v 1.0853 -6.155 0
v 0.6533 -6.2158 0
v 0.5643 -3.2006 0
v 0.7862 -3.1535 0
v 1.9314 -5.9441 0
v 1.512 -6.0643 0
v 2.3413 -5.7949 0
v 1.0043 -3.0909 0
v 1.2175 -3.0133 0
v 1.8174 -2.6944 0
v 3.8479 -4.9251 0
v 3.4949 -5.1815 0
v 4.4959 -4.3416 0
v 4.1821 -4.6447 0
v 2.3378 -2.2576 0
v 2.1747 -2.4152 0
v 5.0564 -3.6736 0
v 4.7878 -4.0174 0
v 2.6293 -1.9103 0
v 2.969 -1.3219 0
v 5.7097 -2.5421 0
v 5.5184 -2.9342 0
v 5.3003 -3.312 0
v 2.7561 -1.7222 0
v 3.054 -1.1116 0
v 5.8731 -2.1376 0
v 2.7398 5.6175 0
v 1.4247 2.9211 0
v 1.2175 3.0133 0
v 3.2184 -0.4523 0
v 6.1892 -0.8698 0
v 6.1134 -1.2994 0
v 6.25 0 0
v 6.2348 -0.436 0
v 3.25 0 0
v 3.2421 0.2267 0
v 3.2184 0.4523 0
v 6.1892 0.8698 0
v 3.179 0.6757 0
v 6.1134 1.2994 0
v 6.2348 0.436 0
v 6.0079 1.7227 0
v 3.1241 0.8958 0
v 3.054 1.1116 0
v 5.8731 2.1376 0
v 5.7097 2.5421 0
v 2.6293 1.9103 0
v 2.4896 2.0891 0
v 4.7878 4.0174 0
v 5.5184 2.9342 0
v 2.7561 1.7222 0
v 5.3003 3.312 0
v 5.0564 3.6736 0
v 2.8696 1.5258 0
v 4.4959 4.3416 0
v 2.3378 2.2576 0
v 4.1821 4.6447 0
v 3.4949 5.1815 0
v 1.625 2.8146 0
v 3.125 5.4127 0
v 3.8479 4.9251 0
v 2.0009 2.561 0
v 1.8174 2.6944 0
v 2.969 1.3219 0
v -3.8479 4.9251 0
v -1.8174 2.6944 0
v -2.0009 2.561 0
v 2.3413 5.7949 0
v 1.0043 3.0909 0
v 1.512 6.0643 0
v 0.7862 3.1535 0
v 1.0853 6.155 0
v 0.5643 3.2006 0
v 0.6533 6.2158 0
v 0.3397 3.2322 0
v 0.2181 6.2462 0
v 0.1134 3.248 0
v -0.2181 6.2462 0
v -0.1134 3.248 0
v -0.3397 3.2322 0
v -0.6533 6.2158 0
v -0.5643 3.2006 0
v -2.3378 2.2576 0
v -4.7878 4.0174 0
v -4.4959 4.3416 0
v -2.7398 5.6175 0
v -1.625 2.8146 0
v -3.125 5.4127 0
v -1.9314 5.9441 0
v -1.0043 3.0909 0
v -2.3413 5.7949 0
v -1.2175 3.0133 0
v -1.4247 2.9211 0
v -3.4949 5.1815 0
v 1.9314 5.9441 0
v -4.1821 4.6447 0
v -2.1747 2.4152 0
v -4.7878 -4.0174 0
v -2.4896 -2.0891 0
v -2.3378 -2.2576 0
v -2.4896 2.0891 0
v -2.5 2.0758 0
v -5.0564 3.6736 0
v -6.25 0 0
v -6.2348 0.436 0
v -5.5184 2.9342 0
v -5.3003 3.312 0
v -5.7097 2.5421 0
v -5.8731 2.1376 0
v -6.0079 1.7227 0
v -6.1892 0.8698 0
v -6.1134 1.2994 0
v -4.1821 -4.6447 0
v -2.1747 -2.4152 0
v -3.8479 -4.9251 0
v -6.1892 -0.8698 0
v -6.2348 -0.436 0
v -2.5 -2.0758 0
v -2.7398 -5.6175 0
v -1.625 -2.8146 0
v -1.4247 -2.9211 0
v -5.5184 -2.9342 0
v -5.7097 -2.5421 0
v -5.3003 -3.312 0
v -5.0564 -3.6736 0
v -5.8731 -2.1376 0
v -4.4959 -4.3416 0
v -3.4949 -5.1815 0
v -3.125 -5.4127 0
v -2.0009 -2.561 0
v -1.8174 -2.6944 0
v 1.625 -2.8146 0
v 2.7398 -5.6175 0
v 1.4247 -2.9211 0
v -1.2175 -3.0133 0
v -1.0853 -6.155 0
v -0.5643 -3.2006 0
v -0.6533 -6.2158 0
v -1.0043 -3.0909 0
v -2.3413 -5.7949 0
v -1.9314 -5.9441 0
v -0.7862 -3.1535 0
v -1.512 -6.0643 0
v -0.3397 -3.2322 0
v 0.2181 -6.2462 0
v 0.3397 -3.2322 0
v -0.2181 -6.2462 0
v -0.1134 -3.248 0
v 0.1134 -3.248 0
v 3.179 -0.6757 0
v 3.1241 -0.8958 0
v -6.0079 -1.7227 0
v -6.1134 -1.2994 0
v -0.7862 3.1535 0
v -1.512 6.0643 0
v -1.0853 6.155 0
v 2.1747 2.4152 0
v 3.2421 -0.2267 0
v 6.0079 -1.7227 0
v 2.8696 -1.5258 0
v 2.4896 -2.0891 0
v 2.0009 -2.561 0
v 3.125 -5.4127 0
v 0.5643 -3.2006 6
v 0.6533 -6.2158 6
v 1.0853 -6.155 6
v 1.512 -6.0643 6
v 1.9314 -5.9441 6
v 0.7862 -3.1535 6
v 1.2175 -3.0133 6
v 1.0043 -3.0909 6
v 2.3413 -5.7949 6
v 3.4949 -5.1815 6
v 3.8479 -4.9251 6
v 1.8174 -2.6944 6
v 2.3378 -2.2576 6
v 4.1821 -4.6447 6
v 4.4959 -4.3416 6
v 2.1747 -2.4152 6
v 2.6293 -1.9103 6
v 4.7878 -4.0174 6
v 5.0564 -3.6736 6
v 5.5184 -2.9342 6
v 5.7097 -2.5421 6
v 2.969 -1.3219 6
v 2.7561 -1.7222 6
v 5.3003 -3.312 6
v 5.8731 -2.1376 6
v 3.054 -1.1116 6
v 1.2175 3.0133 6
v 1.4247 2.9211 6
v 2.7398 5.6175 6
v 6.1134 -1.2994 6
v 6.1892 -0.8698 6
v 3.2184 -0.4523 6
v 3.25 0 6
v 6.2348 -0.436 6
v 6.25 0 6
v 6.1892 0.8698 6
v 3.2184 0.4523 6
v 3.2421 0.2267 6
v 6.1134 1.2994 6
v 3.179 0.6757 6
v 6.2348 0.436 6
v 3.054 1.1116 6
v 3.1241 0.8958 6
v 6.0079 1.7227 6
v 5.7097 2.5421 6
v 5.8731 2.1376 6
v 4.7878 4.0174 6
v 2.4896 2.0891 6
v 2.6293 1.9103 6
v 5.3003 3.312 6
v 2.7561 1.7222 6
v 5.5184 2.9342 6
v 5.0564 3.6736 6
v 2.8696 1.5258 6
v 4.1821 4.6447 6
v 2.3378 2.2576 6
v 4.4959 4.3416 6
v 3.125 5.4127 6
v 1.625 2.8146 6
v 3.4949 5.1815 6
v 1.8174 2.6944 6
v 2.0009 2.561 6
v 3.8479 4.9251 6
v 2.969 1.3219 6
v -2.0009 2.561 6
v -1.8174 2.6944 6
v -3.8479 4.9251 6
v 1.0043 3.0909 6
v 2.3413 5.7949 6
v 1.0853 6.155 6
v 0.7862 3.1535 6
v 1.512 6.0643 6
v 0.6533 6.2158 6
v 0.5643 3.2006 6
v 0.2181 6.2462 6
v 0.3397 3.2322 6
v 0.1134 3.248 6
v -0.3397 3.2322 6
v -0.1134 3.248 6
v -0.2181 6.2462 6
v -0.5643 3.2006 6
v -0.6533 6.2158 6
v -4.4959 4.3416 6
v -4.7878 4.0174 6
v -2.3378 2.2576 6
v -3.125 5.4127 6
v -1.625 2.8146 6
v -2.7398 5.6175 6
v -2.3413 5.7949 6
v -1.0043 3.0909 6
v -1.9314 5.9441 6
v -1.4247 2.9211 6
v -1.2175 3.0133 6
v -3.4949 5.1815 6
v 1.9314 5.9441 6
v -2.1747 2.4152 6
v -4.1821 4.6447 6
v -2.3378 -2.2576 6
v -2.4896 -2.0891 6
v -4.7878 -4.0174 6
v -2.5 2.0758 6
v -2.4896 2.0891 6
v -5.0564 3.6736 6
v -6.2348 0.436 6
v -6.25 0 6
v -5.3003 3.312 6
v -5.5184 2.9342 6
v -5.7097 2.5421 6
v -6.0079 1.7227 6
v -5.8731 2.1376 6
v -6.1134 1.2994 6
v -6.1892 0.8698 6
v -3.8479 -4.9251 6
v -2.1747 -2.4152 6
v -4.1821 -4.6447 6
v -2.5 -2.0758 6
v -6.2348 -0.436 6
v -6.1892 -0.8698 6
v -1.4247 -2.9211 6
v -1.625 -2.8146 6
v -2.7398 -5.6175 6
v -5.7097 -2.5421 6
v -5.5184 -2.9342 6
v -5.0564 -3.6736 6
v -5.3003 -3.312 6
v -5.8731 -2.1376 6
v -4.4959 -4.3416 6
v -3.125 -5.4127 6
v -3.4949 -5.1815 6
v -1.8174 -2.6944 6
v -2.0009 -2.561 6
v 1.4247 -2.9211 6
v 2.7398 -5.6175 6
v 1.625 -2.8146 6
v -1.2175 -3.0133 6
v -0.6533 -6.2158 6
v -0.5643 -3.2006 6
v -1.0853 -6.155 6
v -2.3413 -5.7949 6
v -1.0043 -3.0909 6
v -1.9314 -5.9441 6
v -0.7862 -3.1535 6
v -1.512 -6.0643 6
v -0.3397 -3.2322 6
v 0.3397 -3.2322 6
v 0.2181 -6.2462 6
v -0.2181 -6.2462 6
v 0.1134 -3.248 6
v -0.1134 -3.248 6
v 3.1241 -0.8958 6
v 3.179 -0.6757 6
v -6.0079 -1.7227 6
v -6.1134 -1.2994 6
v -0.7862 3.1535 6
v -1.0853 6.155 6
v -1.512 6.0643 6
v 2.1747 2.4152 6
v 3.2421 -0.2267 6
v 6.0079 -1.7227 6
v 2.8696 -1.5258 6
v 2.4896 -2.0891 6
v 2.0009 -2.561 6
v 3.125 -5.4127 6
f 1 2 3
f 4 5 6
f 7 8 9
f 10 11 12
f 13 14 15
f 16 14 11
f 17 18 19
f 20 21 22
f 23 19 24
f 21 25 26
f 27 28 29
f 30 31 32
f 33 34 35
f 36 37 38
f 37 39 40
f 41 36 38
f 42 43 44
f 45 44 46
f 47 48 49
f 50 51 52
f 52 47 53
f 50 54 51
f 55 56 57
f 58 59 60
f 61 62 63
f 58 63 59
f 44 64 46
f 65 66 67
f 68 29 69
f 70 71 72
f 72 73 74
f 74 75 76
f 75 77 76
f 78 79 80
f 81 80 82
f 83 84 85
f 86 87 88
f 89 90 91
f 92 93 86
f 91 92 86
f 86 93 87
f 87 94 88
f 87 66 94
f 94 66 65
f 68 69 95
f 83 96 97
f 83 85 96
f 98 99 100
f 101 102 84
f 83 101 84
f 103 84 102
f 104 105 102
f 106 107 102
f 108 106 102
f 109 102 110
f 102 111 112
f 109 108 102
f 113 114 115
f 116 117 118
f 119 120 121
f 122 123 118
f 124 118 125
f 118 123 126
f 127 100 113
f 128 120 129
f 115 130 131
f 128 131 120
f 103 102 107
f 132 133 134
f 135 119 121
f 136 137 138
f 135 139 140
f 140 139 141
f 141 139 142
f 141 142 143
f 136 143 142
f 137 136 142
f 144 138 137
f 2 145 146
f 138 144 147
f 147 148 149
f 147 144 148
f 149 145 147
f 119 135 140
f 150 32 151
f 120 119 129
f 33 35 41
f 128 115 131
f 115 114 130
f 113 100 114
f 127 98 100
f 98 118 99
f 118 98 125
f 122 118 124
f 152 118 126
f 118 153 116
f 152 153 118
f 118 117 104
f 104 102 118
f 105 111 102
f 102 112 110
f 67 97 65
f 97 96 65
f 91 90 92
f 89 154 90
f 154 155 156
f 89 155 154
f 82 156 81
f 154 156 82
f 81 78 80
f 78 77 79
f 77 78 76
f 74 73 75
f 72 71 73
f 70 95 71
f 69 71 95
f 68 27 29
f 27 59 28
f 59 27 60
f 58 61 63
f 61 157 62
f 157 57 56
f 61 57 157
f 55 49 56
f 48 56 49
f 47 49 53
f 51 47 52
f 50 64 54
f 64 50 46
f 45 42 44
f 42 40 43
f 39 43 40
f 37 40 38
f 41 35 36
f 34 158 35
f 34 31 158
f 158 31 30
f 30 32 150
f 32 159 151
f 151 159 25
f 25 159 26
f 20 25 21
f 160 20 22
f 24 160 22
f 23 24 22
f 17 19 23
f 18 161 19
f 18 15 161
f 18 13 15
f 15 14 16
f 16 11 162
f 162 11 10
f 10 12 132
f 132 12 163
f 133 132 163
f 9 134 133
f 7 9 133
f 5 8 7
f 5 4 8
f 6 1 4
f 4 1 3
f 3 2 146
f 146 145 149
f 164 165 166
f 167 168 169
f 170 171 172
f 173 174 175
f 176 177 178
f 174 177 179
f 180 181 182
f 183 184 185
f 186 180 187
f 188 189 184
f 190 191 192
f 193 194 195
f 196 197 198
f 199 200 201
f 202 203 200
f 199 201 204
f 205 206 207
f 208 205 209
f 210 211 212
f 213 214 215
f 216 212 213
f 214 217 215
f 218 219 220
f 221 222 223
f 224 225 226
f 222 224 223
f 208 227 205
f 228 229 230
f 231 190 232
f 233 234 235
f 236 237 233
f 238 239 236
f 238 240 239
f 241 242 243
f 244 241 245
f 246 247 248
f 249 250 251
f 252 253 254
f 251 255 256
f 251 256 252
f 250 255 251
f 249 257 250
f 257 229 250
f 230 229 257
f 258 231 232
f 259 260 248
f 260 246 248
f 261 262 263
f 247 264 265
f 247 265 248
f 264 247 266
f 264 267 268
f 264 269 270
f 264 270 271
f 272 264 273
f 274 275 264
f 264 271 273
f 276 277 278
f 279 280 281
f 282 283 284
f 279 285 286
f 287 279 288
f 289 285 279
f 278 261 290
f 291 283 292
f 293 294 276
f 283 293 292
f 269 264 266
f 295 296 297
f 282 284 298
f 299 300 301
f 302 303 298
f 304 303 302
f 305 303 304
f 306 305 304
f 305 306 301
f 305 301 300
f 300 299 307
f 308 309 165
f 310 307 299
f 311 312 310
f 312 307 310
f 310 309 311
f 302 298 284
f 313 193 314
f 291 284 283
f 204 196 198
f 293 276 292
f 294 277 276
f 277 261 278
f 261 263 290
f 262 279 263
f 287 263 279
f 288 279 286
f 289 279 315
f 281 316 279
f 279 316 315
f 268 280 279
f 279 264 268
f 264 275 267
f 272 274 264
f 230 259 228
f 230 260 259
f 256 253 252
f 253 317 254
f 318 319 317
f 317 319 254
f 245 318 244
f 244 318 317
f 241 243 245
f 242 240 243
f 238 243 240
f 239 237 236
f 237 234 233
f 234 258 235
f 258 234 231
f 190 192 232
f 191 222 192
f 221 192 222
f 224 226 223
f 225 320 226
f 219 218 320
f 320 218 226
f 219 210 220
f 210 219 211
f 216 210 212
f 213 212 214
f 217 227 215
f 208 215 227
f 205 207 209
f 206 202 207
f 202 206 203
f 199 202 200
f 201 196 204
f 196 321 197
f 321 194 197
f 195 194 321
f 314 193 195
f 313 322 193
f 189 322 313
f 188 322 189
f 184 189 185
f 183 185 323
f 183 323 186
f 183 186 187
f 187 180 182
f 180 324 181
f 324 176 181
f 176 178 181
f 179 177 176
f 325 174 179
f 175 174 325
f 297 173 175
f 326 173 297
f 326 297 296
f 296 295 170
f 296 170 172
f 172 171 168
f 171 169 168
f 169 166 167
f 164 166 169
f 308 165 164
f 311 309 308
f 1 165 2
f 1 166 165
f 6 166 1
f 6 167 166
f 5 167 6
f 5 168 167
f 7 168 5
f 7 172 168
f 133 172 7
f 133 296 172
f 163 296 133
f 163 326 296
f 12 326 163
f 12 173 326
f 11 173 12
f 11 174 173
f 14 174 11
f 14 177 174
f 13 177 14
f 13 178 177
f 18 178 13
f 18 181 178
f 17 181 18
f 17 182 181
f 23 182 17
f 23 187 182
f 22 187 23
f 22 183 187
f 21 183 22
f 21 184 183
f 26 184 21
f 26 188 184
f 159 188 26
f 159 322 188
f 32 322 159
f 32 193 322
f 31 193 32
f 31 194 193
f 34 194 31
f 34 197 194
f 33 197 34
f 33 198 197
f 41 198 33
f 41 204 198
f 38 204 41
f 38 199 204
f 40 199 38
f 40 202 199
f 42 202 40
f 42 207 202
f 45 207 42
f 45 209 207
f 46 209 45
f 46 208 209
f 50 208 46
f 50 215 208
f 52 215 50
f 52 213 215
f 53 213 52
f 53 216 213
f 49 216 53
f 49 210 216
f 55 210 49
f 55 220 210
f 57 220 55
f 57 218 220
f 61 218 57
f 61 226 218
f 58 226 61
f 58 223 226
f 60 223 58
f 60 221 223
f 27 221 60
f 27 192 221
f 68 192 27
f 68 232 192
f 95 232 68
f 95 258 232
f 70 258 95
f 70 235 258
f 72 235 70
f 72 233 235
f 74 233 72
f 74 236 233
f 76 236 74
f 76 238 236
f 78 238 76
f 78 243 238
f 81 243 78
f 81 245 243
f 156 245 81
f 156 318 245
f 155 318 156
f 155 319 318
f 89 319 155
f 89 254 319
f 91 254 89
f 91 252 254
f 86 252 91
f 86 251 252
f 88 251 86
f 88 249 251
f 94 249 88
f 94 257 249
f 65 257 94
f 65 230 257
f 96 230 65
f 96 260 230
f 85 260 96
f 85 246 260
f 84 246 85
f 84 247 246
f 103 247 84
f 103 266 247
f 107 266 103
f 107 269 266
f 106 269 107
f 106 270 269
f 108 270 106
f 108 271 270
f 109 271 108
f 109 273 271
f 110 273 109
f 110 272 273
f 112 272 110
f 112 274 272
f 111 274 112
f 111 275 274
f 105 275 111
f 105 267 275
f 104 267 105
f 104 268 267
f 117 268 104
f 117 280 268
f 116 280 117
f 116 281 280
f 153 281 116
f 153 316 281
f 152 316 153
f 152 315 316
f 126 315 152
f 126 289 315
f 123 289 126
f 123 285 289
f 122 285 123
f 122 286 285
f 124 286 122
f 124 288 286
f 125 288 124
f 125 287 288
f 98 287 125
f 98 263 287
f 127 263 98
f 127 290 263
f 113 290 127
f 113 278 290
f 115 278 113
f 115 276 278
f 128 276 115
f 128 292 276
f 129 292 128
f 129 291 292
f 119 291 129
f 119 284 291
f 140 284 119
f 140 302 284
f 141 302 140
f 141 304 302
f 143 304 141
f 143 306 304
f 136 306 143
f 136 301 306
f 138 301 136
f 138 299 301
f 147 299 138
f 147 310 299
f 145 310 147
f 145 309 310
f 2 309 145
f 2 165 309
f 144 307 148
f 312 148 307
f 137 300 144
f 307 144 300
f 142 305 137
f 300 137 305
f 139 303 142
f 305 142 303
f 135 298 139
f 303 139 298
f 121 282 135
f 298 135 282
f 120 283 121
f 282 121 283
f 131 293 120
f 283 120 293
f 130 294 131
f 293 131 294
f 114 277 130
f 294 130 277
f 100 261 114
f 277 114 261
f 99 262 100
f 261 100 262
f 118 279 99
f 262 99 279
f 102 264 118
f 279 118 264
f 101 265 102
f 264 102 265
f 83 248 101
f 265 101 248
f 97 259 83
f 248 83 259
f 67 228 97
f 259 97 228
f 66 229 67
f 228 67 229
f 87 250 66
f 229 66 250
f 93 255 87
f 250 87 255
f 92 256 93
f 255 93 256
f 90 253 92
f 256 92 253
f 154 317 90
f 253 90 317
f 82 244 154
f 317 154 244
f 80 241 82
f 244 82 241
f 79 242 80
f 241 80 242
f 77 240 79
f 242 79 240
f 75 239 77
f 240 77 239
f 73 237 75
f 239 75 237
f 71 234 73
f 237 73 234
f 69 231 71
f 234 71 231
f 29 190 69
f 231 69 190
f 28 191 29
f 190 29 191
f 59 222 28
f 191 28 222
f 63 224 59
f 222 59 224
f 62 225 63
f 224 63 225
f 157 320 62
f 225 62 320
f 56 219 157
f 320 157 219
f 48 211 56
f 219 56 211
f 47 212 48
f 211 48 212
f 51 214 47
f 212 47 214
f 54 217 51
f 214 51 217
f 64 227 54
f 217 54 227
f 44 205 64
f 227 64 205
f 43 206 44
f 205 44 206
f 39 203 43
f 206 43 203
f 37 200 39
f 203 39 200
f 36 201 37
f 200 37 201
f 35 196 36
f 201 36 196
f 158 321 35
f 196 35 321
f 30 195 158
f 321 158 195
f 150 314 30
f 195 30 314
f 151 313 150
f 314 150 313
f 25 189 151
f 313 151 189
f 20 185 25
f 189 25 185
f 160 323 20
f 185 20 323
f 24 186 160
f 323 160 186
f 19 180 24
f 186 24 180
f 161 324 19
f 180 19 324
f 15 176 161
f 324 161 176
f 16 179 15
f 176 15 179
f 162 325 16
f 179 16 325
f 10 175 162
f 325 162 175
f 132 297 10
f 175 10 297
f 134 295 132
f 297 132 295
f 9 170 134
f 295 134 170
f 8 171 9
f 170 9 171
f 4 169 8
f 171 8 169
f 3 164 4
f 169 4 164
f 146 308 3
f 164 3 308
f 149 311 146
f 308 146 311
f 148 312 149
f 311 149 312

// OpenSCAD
/*

 small part for a VO&S Spinnewiel:
 it's an bushing to slide along the flight in
 order to fix washers in place. Washers are needed to balance
 the flight.

 the 2 modules, outline() and punchout()
 describe the outline of the part and the holes
 to be punched out.

 Punchout is then subtracted from outline and the result
 is given thickness.
*/

$fn=90;

// flight is 6.5mm with a .5mm flat edge ground
// on one side. It keeps the eyelet straight
flight_dia=6.5;
flight_vlak=.5;

thickness=6;

// bus goes over flight
bus_thickness=6;
bus_id=flight_dia;
bus_od=bus_id+bus_thickness;

// create the eyelet: lay down the outline, punch a few holes
// and extrude it a bit
linear_extrude(height=thickness, center=false, convexity=10) {
    difference() {
        outline();
        punchout();
    }
}

module punchout() {
    intersection() {
        circle(d=flight_dia);
        // the flight has a flat side to register
        translate([flight_vlak,0])
            square(
                [flight_dia-flight_vlak,flight_dia],
                center=true);
    }
}

module outline() {
    circle(d=bus_od);
}
